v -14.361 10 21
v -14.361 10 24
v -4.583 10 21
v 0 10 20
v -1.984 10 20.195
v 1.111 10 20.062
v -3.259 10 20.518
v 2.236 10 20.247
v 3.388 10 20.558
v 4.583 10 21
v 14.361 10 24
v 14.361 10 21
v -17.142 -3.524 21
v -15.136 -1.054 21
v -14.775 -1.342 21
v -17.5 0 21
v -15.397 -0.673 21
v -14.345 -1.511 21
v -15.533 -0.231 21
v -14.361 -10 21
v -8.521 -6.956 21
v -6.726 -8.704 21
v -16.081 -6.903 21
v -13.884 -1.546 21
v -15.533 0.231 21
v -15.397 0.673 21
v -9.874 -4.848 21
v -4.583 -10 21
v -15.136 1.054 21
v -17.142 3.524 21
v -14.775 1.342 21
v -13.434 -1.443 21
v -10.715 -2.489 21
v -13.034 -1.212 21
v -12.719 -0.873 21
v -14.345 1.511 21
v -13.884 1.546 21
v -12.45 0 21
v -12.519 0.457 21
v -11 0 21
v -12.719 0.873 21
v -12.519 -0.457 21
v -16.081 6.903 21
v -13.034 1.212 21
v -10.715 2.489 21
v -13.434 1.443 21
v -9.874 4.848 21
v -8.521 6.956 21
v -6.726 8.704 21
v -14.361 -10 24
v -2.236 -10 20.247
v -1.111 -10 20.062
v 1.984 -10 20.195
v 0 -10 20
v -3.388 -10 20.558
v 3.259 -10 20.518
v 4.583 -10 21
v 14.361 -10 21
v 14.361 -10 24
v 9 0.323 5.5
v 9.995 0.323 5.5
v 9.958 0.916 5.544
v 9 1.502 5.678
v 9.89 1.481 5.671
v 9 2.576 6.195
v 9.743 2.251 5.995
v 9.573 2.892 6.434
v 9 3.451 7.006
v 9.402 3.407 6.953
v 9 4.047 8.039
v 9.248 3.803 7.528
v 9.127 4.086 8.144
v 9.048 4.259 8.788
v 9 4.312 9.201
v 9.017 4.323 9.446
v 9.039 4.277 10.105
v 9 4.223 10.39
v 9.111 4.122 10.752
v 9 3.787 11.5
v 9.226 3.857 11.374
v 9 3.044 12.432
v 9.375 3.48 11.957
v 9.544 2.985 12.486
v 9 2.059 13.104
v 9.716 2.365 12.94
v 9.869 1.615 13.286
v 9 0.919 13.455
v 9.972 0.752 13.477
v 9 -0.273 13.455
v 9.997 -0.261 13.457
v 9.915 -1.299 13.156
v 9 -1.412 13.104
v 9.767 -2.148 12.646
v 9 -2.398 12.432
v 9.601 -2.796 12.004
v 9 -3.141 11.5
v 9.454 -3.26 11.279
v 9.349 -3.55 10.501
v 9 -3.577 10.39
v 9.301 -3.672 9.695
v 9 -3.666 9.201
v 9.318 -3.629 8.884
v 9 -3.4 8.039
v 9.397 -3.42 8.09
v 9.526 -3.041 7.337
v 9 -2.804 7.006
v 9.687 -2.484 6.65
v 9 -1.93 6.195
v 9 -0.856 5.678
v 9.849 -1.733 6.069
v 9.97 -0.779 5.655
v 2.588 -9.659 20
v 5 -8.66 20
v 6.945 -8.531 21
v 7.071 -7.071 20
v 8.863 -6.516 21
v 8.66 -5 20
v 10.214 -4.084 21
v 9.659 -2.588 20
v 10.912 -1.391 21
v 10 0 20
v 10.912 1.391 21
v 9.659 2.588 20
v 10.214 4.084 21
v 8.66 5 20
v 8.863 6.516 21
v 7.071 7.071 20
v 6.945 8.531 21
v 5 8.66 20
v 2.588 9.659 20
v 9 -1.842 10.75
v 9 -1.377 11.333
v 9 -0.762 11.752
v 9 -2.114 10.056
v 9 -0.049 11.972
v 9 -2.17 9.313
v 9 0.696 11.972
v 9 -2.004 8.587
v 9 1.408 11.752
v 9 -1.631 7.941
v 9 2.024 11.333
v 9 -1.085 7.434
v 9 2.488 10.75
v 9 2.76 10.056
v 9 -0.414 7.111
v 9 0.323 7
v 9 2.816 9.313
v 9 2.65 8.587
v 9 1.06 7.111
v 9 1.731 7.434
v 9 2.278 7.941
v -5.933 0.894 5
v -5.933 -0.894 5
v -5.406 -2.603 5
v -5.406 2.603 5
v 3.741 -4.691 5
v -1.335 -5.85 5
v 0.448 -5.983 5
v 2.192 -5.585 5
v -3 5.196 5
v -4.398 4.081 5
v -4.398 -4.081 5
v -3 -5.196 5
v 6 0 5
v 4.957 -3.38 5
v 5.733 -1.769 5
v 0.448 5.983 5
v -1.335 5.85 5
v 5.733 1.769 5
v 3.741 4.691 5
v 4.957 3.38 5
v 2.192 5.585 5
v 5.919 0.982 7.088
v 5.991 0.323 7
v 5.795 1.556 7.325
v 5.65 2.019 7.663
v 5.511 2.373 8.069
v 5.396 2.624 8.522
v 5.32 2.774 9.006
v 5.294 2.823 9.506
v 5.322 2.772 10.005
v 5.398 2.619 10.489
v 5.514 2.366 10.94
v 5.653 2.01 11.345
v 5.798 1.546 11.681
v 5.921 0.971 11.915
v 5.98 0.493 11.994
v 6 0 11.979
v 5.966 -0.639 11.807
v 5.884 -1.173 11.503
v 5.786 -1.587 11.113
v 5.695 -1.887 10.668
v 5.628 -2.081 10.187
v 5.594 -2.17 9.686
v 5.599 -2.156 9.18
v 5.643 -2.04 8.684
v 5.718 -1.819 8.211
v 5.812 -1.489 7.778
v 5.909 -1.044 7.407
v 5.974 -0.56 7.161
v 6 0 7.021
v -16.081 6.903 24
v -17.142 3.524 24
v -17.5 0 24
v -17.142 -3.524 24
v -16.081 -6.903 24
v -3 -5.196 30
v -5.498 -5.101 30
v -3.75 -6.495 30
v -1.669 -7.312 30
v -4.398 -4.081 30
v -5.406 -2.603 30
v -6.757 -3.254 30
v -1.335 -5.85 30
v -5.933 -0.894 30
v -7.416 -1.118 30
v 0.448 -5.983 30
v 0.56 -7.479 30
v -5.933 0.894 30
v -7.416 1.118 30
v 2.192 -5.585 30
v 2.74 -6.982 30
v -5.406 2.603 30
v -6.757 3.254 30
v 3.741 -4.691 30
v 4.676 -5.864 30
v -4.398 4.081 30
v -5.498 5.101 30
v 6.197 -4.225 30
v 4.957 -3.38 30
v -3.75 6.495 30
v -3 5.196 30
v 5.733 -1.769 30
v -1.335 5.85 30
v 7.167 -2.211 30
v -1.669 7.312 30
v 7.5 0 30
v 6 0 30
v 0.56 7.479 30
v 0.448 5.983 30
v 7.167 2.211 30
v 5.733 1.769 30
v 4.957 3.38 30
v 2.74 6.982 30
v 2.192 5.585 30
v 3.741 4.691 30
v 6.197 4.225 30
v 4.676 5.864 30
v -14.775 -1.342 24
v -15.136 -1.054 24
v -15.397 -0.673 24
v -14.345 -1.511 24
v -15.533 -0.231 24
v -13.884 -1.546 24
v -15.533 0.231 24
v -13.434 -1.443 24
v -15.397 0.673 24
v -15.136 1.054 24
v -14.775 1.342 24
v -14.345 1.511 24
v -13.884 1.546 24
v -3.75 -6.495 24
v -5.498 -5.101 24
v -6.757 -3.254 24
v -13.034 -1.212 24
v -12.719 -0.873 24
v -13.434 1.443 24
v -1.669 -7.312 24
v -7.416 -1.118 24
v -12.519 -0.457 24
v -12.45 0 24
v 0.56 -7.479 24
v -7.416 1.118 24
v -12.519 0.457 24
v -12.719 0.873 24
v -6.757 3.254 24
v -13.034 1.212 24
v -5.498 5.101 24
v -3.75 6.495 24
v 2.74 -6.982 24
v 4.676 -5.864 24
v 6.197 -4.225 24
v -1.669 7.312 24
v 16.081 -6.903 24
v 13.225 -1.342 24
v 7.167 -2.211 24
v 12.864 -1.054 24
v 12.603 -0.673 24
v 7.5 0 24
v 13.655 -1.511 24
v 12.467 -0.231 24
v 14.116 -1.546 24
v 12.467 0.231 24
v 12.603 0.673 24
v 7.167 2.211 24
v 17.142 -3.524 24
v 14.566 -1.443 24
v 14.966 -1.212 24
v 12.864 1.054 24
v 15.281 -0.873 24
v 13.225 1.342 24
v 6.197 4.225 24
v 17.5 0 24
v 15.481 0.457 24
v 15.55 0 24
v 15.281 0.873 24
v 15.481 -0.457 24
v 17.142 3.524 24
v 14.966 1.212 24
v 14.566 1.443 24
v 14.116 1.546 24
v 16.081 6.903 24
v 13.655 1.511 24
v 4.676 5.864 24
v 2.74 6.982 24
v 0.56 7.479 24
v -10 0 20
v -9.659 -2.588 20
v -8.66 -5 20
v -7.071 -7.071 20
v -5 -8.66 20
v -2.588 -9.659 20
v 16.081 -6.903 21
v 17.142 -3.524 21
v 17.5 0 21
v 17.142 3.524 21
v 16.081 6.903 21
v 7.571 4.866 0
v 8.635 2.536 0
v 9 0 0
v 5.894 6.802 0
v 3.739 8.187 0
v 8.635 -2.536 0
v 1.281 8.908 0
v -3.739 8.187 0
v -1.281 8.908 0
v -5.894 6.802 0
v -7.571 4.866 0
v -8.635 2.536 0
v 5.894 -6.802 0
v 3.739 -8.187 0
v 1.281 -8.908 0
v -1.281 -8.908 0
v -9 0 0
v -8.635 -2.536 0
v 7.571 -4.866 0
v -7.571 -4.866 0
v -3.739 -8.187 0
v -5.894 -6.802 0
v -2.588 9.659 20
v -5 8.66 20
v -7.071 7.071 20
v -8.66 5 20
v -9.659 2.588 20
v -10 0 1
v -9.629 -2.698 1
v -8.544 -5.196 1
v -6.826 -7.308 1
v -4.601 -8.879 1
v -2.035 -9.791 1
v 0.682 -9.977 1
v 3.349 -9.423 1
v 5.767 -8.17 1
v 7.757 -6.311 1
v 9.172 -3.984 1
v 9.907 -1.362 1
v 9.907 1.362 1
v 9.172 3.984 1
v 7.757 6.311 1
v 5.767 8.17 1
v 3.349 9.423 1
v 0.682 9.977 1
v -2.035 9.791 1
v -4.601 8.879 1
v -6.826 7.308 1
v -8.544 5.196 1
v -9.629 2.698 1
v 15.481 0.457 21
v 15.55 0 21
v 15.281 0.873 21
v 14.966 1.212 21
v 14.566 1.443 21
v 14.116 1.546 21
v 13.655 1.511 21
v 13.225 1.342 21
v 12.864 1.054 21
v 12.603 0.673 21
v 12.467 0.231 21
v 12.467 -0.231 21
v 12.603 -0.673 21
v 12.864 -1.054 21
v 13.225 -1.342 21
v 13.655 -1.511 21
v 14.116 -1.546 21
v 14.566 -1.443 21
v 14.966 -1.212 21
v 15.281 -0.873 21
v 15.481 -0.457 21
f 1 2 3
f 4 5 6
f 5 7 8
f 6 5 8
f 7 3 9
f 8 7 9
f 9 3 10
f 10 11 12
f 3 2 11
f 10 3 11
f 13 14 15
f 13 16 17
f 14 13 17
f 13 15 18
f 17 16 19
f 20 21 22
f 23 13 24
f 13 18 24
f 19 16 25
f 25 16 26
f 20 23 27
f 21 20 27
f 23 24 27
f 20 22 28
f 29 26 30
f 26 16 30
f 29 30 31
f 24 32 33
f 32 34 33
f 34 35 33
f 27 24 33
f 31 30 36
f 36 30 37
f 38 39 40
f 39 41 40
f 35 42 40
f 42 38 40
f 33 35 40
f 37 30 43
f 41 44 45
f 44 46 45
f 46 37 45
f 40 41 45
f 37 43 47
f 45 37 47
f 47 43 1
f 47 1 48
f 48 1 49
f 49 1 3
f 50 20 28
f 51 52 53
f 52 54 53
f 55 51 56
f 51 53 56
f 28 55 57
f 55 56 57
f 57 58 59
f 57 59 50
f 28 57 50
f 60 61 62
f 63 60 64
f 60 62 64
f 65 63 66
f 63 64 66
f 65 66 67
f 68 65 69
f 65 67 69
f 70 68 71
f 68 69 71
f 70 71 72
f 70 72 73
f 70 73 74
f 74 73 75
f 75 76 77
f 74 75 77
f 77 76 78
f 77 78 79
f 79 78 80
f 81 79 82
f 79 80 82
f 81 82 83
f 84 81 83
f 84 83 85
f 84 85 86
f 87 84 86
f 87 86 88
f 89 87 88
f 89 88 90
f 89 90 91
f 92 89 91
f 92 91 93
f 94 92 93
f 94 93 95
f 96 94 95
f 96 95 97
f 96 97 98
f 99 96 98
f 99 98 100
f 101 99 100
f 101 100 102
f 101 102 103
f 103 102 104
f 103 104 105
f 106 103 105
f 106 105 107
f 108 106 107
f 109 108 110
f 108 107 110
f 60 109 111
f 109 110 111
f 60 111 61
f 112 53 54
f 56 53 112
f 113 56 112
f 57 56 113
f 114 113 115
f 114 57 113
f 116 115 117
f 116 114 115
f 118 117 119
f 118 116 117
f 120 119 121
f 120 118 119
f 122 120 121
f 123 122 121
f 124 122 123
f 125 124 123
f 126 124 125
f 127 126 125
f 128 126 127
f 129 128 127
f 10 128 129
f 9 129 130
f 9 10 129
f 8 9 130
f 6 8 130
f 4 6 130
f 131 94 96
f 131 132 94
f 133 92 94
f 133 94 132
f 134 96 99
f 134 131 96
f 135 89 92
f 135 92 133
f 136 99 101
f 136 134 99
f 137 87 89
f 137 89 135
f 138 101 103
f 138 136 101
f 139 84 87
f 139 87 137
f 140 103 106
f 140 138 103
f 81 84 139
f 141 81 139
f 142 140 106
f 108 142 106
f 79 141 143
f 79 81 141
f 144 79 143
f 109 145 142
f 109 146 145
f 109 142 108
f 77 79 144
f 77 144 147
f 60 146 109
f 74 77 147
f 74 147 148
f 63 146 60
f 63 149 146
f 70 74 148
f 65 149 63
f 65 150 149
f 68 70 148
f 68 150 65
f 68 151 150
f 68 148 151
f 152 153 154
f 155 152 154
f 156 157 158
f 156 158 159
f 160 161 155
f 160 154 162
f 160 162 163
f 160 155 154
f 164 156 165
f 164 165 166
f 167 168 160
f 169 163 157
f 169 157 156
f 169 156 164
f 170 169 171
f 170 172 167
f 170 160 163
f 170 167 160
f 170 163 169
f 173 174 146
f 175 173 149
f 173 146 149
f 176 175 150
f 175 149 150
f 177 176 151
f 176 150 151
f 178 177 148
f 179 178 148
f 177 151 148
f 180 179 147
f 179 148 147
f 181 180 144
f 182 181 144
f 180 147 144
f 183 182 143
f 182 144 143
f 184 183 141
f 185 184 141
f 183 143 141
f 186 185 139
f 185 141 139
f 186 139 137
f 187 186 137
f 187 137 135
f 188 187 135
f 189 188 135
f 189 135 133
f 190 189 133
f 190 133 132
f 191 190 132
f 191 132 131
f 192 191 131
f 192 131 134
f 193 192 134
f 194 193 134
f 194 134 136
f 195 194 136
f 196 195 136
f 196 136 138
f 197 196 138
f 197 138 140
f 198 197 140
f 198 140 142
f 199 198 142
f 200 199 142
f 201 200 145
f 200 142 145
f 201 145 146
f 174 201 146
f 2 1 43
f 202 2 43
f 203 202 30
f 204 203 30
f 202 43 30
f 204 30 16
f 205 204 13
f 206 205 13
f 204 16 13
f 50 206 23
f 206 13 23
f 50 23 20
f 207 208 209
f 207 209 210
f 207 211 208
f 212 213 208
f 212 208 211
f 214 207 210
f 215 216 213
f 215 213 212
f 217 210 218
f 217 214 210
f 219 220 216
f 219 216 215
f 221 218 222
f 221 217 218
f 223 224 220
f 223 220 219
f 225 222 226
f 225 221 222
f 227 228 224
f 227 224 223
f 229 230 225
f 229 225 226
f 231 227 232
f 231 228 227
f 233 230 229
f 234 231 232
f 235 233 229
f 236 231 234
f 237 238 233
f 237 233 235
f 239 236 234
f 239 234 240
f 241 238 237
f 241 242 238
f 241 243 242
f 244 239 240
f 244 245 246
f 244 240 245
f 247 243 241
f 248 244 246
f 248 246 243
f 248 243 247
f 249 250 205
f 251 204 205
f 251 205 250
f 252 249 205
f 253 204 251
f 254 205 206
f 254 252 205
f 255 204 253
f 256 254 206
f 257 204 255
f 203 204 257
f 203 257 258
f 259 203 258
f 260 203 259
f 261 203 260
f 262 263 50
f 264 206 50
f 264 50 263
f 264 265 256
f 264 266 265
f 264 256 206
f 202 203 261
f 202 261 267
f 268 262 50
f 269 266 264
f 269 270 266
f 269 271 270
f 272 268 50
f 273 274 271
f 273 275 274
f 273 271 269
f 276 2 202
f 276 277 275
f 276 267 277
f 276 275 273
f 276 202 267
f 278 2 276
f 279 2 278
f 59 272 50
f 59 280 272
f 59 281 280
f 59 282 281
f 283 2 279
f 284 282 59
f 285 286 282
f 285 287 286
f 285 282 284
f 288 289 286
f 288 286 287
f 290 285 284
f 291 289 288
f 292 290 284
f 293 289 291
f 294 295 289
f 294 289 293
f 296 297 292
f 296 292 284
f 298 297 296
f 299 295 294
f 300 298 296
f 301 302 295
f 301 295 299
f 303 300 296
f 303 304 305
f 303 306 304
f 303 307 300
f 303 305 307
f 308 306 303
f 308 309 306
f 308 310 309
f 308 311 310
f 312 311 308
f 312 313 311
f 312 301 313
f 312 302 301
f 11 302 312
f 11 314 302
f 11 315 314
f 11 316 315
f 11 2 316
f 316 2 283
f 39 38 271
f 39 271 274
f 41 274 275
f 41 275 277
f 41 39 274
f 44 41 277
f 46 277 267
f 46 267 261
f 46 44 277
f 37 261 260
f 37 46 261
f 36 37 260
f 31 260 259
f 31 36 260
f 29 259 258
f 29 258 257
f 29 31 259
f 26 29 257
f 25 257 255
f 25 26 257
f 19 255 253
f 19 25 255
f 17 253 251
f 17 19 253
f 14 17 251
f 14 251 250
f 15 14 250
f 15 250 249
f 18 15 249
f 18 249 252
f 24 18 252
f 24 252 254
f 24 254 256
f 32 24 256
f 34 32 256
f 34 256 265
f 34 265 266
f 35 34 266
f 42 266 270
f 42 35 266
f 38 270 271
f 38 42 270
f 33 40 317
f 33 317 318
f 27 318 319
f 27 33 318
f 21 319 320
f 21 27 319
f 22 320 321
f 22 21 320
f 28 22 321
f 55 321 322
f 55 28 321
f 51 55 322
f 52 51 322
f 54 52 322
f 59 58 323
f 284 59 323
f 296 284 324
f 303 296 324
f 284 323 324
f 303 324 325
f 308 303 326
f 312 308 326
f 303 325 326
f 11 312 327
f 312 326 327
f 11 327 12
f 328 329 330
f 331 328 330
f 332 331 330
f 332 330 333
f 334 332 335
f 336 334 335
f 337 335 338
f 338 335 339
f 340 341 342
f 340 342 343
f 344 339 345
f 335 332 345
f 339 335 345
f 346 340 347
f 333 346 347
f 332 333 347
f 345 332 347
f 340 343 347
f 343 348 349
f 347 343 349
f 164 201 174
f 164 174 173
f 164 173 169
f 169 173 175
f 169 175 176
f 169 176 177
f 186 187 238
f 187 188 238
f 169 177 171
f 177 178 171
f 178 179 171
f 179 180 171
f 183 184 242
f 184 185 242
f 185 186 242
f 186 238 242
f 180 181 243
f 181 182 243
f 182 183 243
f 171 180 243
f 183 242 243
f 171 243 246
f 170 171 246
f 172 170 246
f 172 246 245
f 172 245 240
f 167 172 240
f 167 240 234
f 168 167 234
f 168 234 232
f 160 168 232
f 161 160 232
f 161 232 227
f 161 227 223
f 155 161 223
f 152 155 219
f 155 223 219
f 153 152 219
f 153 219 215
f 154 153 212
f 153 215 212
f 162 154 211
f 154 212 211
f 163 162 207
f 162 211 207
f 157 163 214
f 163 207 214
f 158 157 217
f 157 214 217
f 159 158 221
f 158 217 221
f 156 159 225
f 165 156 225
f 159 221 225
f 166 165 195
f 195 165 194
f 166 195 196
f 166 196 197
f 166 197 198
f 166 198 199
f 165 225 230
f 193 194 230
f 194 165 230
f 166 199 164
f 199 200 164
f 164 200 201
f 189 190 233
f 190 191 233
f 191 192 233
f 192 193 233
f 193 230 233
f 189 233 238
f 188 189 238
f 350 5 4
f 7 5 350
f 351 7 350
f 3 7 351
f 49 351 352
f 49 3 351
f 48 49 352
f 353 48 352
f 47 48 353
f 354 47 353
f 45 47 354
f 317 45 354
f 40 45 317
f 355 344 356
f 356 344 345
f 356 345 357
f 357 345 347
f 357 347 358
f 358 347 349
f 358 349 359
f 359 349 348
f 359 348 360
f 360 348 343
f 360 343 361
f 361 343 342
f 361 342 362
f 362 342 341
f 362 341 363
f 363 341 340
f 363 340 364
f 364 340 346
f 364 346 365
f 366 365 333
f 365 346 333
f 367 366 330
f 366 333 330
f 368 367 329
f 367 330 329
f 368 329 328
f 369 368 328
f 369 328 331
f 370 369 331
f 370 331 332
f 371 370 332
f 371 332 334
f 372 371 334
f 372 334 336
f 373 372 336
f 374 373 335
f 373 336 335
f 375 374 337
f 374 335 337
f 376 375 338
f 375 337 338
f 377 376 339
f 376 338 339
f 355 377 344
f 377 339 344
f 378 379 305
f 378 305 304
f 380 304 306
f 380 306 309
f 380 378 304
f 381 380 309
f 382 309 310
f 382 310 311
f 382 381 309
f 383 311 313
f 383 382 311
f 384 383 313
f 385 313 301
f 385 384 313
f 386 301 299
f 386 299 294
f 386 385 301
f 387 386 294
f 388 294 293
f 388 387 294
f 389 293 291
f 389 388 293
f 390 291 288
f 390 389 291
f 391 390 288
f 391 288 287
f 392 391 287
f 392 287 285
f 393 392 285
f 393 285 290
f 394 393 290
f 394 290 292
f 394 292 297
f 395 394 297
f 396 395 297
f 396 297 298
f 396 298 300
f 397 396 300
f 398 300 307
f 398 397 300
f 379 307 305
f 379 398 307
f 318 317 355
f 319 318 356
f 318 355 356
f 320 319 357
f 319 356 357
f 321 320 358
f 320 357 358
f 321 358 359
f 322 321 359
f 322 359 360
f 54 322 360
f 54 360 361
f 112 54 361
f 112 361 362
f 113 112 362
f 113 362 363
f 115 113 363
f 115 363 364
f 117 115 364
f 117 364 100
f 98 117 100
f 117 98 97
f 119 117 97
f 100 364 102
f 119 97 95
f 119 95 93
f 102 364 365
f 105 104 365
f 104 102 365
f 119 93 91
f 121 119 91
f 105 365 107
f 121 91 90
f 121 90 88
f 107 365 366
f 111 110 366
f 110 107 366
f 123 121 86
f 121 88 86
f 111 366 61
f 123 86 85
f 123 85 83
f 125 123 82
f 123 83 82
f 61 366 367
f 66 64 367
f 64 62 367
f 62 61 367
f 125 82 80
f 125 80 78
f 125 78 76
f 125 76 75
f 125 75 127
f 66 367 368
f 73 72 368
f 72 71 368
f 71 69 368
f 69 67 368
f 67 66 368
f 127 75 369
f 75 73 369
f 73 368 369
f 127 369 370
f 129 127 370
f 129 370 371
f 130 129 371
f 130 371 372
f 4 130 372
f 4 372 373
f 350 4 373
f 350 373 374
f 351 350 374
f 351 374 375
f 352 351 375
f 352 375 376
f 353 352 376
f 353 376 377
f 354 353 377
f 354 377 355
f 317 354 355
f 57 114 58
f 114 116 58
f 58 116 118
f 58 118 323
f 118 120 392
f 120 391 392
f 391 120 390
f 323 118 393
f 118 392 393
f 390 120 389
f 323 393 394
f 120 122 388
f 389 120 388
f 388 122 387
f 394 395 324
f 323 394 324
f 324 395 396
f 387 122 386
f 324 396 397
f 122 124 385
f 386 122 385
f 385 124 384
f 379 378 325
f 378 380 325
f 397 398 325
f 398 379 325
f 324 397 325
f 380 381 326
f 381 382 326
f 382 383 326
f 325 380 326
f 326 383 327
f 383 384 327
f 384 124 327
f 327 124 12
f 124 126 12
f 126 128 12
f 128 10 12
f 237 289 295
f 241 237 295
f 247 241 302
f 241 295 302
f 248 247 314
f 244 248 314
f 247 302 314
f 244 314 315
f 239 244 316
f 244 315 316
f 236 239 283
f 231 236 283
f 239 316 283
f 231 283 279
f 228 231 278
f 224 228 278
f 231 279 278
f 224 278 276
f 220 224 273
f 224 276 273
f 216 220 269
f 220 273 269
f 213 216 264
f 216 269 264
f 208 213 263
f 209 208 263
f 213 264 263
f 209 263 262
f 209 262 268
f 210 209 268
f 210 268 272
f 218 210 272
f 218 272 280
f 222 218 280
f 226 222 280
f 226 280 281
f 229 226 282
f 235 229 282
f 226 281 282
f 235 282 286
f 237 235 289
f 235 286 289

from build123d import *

# Parameters (mm, degrees)
SKETCH2_R           = 10
BOSS_EXTRUDE1_DEPTH = 21
SKETCH3_R           = 1.55
BOSS_EXTRUDE3_DEPTH = 3
SKETCH4_R           = 7.5
BOSS_EXTRUDE4_DEPTH = 6
SKETCH5_R           = 6
CUT_EXTRUDE1_DEPTH  = 25
SKETCH6_R           = 4
CUT_EXTRUDE2_DEPTH  = 1
SKETCH7_R           = 2.5
CUT_EXTRUDE3_DEPTH  = 7
CHAMFER1_SIZE       = 1
CHAMFER2_SIZE       = 1


with BuildPart() as part:
    # Sketch2 → Boss-Extrude1 (new body)
    with BuildSketch(Plane.XY):
        with Locations(Location((0, 0, 0), (0, 0, 180))):
            Circle(SKETCH2_R)
    extrude(amount=BOSS_EXTRUDE1_DEPTH)

    # Sketch3 → Boss-Extrude3 (add)
    with BuildSketch(Plane.XY.offset(21)):
        with BuildLine():
            Line((14.361406616, 10), (-14.361406616, 10))
            ThreePointArc((-14.361406616, 10), (-17.5, 0), (-14.361406616, -10))
            Line((-14.361406616, -10), (14.361406616, -10))
            ThreePointArc((14.361406616, -10), (17.5, 0), (14.361406616, 10))
        make_face()
        with Locations((14, 0)):
            Circle(SKETCH3_R, mode=Mode.SUBTRACT)
        with Locations((-14, 0)):
            Circle(SKETCH3_R, mode=Mode.SUBTRACT)
    extrude(amount=BOSS_EXTRUDE3_DEPTH)

    # Sketch4 → Boss-Extrude4 (add)
    with BuildSketch(Plane.XY.offset(24)):
        Circle(SKETCH4_R)
    extrude(amount=BOSS_EXTRUDE4_DEPTH)

    # Sketch5 → Cut-Extrude1 (cut)
    with BuildSketch(Plane.XY.offset(30)):
        Circle(SKETCH5_R)
    extrude(amount=-CUT_EXTRUDE1_DEPTH, mode=Mode.SUBTRACT)

    # Sketch6 → Cut-Extrude2 (cut)
    with BuildSketch(Plane(origin=(10, 0, 0), x_dir=(0, 0, -1), z_dir=(1, 0, 0))):
        with Locations((-9.5, 0.3231801)):
            Circle(SKETCH6_R)
    extrude(amount=-CUT_EXTRUDE2_DEPTH, mode=Mode.SUBTRACT)

    # Sketch7 → Cut-Extrude3 (cut)
    with BuildSketch(Plane(origin=(9, 0, 0), x_dir=(0, 0, -1), z_dir=(1, 0, 0))):
        with Locations((-9.5, 0.3231801)):
            Circle(SKETCH7_R)
    extrude(amount=-CUT_EXTRUDE3_DEPTH, mode=Mode.SUBTRACT)

    # Chamfer1
    chamfer1_edges = [part.edges().sort_by_distance(p)[0] for p in [
        (10, 0, 0),
    ]]
    chamfer(chamfer1_edges, length=CHAMFER1_SIZE)

    # Chamfer2
    # the kernel refuses this chamfer: 1 mm, written as the material it adds along each edge
    with BuildSketch(Plane(origin=(0, 0, 21), x_dir=(-1, 0, 0), z_dir=(0, 1, 0))) as chamfer2_piece_1_section:
        Polygon((10, -CHAMFER2_SIZE), (10 + CHAMFER2_SIZE, 0), (10, 0), align=None)
    chamfer2_piece_1 = revolve(axis=Axis((0, 0, 21), (0, 0, 1)), revolution_arc=90.000000093, mode=Mode.PRIVATE)
    chamfer2_piece_1 = split(chamfer2_piece_1, bisect_by=Plane(origin=(-7.415105154, -10, 20.513457715), z_dir=(0, 1, 0)), keep=Keep.TOP, mode=Mode.PRIVATE)
    add(chamfer2_piece_1)
    with BuildSketch(Plane(origin=(0, 0, 21), x_dir=(1.6193002877922622e-09, -1.0, 0), z_dir=(-1.0, -1.6193002877922622e-09, 0))) as chamfer2_piece_2_section:
        Polygon((10, -CHAMFER2_SIZE), (10 + CHAMFER2_SIZE, 0), (10, 0), align=None)
    chamfer2_piece_2 = revolve(axis=Axis((0, 0, 21), (0, 0, 1)), revolution_arc=180.00000015, mode=Mode.PRIVATE)
    chamfer2_piece_2 = split(chamfer2_piece_2, bisect_by=Plane(origin=(10.48304434, 10, 20.516955657), z_dir=(0, -1, 0)), keep=Keep.TOP, mode=Mode.PRIVATE)
    chamfer2_piece_2 = split(chamfer2_piece_2, bisect_by=Plane(origin=(10.48304434, -10, 20.516955657), z_dir=(0, 1, 0)), keep=Keep.TOP, mode=Mode.PRIVATE)
    add(chamfer2_piece_2)
    with BuildSketch(Plane(origin=(0, 0, 21), x_dir=(-4.239322364523242e-09, 1.0, 0), z_dir=(1.0, 4.239322364523242e-09, 0))) as chamfer2_piece_3_section:
        Polygon((10, -CHAMFER2_SIZE), (10 + CHAMFER2_SIZE, 0), (10, 0), align=None)
    chamfer2_piece_3 = revolve(axis=Axis((0, 0, 21), (0, 0, 1)), revolution_arc=89.999999757, mode=Mode.PRIVATE)
    chamfer2_piece_3 = split(chamfer2_piece_3, bisect_by=Plane(origin=(-7.415105177, 10, 20.513457715), z_dir=(0, -1, 0)), keep=Keep.TOP, mode=Mode.PRIVATE)
    add(chamfer2_piece_3)


solid = part.part
